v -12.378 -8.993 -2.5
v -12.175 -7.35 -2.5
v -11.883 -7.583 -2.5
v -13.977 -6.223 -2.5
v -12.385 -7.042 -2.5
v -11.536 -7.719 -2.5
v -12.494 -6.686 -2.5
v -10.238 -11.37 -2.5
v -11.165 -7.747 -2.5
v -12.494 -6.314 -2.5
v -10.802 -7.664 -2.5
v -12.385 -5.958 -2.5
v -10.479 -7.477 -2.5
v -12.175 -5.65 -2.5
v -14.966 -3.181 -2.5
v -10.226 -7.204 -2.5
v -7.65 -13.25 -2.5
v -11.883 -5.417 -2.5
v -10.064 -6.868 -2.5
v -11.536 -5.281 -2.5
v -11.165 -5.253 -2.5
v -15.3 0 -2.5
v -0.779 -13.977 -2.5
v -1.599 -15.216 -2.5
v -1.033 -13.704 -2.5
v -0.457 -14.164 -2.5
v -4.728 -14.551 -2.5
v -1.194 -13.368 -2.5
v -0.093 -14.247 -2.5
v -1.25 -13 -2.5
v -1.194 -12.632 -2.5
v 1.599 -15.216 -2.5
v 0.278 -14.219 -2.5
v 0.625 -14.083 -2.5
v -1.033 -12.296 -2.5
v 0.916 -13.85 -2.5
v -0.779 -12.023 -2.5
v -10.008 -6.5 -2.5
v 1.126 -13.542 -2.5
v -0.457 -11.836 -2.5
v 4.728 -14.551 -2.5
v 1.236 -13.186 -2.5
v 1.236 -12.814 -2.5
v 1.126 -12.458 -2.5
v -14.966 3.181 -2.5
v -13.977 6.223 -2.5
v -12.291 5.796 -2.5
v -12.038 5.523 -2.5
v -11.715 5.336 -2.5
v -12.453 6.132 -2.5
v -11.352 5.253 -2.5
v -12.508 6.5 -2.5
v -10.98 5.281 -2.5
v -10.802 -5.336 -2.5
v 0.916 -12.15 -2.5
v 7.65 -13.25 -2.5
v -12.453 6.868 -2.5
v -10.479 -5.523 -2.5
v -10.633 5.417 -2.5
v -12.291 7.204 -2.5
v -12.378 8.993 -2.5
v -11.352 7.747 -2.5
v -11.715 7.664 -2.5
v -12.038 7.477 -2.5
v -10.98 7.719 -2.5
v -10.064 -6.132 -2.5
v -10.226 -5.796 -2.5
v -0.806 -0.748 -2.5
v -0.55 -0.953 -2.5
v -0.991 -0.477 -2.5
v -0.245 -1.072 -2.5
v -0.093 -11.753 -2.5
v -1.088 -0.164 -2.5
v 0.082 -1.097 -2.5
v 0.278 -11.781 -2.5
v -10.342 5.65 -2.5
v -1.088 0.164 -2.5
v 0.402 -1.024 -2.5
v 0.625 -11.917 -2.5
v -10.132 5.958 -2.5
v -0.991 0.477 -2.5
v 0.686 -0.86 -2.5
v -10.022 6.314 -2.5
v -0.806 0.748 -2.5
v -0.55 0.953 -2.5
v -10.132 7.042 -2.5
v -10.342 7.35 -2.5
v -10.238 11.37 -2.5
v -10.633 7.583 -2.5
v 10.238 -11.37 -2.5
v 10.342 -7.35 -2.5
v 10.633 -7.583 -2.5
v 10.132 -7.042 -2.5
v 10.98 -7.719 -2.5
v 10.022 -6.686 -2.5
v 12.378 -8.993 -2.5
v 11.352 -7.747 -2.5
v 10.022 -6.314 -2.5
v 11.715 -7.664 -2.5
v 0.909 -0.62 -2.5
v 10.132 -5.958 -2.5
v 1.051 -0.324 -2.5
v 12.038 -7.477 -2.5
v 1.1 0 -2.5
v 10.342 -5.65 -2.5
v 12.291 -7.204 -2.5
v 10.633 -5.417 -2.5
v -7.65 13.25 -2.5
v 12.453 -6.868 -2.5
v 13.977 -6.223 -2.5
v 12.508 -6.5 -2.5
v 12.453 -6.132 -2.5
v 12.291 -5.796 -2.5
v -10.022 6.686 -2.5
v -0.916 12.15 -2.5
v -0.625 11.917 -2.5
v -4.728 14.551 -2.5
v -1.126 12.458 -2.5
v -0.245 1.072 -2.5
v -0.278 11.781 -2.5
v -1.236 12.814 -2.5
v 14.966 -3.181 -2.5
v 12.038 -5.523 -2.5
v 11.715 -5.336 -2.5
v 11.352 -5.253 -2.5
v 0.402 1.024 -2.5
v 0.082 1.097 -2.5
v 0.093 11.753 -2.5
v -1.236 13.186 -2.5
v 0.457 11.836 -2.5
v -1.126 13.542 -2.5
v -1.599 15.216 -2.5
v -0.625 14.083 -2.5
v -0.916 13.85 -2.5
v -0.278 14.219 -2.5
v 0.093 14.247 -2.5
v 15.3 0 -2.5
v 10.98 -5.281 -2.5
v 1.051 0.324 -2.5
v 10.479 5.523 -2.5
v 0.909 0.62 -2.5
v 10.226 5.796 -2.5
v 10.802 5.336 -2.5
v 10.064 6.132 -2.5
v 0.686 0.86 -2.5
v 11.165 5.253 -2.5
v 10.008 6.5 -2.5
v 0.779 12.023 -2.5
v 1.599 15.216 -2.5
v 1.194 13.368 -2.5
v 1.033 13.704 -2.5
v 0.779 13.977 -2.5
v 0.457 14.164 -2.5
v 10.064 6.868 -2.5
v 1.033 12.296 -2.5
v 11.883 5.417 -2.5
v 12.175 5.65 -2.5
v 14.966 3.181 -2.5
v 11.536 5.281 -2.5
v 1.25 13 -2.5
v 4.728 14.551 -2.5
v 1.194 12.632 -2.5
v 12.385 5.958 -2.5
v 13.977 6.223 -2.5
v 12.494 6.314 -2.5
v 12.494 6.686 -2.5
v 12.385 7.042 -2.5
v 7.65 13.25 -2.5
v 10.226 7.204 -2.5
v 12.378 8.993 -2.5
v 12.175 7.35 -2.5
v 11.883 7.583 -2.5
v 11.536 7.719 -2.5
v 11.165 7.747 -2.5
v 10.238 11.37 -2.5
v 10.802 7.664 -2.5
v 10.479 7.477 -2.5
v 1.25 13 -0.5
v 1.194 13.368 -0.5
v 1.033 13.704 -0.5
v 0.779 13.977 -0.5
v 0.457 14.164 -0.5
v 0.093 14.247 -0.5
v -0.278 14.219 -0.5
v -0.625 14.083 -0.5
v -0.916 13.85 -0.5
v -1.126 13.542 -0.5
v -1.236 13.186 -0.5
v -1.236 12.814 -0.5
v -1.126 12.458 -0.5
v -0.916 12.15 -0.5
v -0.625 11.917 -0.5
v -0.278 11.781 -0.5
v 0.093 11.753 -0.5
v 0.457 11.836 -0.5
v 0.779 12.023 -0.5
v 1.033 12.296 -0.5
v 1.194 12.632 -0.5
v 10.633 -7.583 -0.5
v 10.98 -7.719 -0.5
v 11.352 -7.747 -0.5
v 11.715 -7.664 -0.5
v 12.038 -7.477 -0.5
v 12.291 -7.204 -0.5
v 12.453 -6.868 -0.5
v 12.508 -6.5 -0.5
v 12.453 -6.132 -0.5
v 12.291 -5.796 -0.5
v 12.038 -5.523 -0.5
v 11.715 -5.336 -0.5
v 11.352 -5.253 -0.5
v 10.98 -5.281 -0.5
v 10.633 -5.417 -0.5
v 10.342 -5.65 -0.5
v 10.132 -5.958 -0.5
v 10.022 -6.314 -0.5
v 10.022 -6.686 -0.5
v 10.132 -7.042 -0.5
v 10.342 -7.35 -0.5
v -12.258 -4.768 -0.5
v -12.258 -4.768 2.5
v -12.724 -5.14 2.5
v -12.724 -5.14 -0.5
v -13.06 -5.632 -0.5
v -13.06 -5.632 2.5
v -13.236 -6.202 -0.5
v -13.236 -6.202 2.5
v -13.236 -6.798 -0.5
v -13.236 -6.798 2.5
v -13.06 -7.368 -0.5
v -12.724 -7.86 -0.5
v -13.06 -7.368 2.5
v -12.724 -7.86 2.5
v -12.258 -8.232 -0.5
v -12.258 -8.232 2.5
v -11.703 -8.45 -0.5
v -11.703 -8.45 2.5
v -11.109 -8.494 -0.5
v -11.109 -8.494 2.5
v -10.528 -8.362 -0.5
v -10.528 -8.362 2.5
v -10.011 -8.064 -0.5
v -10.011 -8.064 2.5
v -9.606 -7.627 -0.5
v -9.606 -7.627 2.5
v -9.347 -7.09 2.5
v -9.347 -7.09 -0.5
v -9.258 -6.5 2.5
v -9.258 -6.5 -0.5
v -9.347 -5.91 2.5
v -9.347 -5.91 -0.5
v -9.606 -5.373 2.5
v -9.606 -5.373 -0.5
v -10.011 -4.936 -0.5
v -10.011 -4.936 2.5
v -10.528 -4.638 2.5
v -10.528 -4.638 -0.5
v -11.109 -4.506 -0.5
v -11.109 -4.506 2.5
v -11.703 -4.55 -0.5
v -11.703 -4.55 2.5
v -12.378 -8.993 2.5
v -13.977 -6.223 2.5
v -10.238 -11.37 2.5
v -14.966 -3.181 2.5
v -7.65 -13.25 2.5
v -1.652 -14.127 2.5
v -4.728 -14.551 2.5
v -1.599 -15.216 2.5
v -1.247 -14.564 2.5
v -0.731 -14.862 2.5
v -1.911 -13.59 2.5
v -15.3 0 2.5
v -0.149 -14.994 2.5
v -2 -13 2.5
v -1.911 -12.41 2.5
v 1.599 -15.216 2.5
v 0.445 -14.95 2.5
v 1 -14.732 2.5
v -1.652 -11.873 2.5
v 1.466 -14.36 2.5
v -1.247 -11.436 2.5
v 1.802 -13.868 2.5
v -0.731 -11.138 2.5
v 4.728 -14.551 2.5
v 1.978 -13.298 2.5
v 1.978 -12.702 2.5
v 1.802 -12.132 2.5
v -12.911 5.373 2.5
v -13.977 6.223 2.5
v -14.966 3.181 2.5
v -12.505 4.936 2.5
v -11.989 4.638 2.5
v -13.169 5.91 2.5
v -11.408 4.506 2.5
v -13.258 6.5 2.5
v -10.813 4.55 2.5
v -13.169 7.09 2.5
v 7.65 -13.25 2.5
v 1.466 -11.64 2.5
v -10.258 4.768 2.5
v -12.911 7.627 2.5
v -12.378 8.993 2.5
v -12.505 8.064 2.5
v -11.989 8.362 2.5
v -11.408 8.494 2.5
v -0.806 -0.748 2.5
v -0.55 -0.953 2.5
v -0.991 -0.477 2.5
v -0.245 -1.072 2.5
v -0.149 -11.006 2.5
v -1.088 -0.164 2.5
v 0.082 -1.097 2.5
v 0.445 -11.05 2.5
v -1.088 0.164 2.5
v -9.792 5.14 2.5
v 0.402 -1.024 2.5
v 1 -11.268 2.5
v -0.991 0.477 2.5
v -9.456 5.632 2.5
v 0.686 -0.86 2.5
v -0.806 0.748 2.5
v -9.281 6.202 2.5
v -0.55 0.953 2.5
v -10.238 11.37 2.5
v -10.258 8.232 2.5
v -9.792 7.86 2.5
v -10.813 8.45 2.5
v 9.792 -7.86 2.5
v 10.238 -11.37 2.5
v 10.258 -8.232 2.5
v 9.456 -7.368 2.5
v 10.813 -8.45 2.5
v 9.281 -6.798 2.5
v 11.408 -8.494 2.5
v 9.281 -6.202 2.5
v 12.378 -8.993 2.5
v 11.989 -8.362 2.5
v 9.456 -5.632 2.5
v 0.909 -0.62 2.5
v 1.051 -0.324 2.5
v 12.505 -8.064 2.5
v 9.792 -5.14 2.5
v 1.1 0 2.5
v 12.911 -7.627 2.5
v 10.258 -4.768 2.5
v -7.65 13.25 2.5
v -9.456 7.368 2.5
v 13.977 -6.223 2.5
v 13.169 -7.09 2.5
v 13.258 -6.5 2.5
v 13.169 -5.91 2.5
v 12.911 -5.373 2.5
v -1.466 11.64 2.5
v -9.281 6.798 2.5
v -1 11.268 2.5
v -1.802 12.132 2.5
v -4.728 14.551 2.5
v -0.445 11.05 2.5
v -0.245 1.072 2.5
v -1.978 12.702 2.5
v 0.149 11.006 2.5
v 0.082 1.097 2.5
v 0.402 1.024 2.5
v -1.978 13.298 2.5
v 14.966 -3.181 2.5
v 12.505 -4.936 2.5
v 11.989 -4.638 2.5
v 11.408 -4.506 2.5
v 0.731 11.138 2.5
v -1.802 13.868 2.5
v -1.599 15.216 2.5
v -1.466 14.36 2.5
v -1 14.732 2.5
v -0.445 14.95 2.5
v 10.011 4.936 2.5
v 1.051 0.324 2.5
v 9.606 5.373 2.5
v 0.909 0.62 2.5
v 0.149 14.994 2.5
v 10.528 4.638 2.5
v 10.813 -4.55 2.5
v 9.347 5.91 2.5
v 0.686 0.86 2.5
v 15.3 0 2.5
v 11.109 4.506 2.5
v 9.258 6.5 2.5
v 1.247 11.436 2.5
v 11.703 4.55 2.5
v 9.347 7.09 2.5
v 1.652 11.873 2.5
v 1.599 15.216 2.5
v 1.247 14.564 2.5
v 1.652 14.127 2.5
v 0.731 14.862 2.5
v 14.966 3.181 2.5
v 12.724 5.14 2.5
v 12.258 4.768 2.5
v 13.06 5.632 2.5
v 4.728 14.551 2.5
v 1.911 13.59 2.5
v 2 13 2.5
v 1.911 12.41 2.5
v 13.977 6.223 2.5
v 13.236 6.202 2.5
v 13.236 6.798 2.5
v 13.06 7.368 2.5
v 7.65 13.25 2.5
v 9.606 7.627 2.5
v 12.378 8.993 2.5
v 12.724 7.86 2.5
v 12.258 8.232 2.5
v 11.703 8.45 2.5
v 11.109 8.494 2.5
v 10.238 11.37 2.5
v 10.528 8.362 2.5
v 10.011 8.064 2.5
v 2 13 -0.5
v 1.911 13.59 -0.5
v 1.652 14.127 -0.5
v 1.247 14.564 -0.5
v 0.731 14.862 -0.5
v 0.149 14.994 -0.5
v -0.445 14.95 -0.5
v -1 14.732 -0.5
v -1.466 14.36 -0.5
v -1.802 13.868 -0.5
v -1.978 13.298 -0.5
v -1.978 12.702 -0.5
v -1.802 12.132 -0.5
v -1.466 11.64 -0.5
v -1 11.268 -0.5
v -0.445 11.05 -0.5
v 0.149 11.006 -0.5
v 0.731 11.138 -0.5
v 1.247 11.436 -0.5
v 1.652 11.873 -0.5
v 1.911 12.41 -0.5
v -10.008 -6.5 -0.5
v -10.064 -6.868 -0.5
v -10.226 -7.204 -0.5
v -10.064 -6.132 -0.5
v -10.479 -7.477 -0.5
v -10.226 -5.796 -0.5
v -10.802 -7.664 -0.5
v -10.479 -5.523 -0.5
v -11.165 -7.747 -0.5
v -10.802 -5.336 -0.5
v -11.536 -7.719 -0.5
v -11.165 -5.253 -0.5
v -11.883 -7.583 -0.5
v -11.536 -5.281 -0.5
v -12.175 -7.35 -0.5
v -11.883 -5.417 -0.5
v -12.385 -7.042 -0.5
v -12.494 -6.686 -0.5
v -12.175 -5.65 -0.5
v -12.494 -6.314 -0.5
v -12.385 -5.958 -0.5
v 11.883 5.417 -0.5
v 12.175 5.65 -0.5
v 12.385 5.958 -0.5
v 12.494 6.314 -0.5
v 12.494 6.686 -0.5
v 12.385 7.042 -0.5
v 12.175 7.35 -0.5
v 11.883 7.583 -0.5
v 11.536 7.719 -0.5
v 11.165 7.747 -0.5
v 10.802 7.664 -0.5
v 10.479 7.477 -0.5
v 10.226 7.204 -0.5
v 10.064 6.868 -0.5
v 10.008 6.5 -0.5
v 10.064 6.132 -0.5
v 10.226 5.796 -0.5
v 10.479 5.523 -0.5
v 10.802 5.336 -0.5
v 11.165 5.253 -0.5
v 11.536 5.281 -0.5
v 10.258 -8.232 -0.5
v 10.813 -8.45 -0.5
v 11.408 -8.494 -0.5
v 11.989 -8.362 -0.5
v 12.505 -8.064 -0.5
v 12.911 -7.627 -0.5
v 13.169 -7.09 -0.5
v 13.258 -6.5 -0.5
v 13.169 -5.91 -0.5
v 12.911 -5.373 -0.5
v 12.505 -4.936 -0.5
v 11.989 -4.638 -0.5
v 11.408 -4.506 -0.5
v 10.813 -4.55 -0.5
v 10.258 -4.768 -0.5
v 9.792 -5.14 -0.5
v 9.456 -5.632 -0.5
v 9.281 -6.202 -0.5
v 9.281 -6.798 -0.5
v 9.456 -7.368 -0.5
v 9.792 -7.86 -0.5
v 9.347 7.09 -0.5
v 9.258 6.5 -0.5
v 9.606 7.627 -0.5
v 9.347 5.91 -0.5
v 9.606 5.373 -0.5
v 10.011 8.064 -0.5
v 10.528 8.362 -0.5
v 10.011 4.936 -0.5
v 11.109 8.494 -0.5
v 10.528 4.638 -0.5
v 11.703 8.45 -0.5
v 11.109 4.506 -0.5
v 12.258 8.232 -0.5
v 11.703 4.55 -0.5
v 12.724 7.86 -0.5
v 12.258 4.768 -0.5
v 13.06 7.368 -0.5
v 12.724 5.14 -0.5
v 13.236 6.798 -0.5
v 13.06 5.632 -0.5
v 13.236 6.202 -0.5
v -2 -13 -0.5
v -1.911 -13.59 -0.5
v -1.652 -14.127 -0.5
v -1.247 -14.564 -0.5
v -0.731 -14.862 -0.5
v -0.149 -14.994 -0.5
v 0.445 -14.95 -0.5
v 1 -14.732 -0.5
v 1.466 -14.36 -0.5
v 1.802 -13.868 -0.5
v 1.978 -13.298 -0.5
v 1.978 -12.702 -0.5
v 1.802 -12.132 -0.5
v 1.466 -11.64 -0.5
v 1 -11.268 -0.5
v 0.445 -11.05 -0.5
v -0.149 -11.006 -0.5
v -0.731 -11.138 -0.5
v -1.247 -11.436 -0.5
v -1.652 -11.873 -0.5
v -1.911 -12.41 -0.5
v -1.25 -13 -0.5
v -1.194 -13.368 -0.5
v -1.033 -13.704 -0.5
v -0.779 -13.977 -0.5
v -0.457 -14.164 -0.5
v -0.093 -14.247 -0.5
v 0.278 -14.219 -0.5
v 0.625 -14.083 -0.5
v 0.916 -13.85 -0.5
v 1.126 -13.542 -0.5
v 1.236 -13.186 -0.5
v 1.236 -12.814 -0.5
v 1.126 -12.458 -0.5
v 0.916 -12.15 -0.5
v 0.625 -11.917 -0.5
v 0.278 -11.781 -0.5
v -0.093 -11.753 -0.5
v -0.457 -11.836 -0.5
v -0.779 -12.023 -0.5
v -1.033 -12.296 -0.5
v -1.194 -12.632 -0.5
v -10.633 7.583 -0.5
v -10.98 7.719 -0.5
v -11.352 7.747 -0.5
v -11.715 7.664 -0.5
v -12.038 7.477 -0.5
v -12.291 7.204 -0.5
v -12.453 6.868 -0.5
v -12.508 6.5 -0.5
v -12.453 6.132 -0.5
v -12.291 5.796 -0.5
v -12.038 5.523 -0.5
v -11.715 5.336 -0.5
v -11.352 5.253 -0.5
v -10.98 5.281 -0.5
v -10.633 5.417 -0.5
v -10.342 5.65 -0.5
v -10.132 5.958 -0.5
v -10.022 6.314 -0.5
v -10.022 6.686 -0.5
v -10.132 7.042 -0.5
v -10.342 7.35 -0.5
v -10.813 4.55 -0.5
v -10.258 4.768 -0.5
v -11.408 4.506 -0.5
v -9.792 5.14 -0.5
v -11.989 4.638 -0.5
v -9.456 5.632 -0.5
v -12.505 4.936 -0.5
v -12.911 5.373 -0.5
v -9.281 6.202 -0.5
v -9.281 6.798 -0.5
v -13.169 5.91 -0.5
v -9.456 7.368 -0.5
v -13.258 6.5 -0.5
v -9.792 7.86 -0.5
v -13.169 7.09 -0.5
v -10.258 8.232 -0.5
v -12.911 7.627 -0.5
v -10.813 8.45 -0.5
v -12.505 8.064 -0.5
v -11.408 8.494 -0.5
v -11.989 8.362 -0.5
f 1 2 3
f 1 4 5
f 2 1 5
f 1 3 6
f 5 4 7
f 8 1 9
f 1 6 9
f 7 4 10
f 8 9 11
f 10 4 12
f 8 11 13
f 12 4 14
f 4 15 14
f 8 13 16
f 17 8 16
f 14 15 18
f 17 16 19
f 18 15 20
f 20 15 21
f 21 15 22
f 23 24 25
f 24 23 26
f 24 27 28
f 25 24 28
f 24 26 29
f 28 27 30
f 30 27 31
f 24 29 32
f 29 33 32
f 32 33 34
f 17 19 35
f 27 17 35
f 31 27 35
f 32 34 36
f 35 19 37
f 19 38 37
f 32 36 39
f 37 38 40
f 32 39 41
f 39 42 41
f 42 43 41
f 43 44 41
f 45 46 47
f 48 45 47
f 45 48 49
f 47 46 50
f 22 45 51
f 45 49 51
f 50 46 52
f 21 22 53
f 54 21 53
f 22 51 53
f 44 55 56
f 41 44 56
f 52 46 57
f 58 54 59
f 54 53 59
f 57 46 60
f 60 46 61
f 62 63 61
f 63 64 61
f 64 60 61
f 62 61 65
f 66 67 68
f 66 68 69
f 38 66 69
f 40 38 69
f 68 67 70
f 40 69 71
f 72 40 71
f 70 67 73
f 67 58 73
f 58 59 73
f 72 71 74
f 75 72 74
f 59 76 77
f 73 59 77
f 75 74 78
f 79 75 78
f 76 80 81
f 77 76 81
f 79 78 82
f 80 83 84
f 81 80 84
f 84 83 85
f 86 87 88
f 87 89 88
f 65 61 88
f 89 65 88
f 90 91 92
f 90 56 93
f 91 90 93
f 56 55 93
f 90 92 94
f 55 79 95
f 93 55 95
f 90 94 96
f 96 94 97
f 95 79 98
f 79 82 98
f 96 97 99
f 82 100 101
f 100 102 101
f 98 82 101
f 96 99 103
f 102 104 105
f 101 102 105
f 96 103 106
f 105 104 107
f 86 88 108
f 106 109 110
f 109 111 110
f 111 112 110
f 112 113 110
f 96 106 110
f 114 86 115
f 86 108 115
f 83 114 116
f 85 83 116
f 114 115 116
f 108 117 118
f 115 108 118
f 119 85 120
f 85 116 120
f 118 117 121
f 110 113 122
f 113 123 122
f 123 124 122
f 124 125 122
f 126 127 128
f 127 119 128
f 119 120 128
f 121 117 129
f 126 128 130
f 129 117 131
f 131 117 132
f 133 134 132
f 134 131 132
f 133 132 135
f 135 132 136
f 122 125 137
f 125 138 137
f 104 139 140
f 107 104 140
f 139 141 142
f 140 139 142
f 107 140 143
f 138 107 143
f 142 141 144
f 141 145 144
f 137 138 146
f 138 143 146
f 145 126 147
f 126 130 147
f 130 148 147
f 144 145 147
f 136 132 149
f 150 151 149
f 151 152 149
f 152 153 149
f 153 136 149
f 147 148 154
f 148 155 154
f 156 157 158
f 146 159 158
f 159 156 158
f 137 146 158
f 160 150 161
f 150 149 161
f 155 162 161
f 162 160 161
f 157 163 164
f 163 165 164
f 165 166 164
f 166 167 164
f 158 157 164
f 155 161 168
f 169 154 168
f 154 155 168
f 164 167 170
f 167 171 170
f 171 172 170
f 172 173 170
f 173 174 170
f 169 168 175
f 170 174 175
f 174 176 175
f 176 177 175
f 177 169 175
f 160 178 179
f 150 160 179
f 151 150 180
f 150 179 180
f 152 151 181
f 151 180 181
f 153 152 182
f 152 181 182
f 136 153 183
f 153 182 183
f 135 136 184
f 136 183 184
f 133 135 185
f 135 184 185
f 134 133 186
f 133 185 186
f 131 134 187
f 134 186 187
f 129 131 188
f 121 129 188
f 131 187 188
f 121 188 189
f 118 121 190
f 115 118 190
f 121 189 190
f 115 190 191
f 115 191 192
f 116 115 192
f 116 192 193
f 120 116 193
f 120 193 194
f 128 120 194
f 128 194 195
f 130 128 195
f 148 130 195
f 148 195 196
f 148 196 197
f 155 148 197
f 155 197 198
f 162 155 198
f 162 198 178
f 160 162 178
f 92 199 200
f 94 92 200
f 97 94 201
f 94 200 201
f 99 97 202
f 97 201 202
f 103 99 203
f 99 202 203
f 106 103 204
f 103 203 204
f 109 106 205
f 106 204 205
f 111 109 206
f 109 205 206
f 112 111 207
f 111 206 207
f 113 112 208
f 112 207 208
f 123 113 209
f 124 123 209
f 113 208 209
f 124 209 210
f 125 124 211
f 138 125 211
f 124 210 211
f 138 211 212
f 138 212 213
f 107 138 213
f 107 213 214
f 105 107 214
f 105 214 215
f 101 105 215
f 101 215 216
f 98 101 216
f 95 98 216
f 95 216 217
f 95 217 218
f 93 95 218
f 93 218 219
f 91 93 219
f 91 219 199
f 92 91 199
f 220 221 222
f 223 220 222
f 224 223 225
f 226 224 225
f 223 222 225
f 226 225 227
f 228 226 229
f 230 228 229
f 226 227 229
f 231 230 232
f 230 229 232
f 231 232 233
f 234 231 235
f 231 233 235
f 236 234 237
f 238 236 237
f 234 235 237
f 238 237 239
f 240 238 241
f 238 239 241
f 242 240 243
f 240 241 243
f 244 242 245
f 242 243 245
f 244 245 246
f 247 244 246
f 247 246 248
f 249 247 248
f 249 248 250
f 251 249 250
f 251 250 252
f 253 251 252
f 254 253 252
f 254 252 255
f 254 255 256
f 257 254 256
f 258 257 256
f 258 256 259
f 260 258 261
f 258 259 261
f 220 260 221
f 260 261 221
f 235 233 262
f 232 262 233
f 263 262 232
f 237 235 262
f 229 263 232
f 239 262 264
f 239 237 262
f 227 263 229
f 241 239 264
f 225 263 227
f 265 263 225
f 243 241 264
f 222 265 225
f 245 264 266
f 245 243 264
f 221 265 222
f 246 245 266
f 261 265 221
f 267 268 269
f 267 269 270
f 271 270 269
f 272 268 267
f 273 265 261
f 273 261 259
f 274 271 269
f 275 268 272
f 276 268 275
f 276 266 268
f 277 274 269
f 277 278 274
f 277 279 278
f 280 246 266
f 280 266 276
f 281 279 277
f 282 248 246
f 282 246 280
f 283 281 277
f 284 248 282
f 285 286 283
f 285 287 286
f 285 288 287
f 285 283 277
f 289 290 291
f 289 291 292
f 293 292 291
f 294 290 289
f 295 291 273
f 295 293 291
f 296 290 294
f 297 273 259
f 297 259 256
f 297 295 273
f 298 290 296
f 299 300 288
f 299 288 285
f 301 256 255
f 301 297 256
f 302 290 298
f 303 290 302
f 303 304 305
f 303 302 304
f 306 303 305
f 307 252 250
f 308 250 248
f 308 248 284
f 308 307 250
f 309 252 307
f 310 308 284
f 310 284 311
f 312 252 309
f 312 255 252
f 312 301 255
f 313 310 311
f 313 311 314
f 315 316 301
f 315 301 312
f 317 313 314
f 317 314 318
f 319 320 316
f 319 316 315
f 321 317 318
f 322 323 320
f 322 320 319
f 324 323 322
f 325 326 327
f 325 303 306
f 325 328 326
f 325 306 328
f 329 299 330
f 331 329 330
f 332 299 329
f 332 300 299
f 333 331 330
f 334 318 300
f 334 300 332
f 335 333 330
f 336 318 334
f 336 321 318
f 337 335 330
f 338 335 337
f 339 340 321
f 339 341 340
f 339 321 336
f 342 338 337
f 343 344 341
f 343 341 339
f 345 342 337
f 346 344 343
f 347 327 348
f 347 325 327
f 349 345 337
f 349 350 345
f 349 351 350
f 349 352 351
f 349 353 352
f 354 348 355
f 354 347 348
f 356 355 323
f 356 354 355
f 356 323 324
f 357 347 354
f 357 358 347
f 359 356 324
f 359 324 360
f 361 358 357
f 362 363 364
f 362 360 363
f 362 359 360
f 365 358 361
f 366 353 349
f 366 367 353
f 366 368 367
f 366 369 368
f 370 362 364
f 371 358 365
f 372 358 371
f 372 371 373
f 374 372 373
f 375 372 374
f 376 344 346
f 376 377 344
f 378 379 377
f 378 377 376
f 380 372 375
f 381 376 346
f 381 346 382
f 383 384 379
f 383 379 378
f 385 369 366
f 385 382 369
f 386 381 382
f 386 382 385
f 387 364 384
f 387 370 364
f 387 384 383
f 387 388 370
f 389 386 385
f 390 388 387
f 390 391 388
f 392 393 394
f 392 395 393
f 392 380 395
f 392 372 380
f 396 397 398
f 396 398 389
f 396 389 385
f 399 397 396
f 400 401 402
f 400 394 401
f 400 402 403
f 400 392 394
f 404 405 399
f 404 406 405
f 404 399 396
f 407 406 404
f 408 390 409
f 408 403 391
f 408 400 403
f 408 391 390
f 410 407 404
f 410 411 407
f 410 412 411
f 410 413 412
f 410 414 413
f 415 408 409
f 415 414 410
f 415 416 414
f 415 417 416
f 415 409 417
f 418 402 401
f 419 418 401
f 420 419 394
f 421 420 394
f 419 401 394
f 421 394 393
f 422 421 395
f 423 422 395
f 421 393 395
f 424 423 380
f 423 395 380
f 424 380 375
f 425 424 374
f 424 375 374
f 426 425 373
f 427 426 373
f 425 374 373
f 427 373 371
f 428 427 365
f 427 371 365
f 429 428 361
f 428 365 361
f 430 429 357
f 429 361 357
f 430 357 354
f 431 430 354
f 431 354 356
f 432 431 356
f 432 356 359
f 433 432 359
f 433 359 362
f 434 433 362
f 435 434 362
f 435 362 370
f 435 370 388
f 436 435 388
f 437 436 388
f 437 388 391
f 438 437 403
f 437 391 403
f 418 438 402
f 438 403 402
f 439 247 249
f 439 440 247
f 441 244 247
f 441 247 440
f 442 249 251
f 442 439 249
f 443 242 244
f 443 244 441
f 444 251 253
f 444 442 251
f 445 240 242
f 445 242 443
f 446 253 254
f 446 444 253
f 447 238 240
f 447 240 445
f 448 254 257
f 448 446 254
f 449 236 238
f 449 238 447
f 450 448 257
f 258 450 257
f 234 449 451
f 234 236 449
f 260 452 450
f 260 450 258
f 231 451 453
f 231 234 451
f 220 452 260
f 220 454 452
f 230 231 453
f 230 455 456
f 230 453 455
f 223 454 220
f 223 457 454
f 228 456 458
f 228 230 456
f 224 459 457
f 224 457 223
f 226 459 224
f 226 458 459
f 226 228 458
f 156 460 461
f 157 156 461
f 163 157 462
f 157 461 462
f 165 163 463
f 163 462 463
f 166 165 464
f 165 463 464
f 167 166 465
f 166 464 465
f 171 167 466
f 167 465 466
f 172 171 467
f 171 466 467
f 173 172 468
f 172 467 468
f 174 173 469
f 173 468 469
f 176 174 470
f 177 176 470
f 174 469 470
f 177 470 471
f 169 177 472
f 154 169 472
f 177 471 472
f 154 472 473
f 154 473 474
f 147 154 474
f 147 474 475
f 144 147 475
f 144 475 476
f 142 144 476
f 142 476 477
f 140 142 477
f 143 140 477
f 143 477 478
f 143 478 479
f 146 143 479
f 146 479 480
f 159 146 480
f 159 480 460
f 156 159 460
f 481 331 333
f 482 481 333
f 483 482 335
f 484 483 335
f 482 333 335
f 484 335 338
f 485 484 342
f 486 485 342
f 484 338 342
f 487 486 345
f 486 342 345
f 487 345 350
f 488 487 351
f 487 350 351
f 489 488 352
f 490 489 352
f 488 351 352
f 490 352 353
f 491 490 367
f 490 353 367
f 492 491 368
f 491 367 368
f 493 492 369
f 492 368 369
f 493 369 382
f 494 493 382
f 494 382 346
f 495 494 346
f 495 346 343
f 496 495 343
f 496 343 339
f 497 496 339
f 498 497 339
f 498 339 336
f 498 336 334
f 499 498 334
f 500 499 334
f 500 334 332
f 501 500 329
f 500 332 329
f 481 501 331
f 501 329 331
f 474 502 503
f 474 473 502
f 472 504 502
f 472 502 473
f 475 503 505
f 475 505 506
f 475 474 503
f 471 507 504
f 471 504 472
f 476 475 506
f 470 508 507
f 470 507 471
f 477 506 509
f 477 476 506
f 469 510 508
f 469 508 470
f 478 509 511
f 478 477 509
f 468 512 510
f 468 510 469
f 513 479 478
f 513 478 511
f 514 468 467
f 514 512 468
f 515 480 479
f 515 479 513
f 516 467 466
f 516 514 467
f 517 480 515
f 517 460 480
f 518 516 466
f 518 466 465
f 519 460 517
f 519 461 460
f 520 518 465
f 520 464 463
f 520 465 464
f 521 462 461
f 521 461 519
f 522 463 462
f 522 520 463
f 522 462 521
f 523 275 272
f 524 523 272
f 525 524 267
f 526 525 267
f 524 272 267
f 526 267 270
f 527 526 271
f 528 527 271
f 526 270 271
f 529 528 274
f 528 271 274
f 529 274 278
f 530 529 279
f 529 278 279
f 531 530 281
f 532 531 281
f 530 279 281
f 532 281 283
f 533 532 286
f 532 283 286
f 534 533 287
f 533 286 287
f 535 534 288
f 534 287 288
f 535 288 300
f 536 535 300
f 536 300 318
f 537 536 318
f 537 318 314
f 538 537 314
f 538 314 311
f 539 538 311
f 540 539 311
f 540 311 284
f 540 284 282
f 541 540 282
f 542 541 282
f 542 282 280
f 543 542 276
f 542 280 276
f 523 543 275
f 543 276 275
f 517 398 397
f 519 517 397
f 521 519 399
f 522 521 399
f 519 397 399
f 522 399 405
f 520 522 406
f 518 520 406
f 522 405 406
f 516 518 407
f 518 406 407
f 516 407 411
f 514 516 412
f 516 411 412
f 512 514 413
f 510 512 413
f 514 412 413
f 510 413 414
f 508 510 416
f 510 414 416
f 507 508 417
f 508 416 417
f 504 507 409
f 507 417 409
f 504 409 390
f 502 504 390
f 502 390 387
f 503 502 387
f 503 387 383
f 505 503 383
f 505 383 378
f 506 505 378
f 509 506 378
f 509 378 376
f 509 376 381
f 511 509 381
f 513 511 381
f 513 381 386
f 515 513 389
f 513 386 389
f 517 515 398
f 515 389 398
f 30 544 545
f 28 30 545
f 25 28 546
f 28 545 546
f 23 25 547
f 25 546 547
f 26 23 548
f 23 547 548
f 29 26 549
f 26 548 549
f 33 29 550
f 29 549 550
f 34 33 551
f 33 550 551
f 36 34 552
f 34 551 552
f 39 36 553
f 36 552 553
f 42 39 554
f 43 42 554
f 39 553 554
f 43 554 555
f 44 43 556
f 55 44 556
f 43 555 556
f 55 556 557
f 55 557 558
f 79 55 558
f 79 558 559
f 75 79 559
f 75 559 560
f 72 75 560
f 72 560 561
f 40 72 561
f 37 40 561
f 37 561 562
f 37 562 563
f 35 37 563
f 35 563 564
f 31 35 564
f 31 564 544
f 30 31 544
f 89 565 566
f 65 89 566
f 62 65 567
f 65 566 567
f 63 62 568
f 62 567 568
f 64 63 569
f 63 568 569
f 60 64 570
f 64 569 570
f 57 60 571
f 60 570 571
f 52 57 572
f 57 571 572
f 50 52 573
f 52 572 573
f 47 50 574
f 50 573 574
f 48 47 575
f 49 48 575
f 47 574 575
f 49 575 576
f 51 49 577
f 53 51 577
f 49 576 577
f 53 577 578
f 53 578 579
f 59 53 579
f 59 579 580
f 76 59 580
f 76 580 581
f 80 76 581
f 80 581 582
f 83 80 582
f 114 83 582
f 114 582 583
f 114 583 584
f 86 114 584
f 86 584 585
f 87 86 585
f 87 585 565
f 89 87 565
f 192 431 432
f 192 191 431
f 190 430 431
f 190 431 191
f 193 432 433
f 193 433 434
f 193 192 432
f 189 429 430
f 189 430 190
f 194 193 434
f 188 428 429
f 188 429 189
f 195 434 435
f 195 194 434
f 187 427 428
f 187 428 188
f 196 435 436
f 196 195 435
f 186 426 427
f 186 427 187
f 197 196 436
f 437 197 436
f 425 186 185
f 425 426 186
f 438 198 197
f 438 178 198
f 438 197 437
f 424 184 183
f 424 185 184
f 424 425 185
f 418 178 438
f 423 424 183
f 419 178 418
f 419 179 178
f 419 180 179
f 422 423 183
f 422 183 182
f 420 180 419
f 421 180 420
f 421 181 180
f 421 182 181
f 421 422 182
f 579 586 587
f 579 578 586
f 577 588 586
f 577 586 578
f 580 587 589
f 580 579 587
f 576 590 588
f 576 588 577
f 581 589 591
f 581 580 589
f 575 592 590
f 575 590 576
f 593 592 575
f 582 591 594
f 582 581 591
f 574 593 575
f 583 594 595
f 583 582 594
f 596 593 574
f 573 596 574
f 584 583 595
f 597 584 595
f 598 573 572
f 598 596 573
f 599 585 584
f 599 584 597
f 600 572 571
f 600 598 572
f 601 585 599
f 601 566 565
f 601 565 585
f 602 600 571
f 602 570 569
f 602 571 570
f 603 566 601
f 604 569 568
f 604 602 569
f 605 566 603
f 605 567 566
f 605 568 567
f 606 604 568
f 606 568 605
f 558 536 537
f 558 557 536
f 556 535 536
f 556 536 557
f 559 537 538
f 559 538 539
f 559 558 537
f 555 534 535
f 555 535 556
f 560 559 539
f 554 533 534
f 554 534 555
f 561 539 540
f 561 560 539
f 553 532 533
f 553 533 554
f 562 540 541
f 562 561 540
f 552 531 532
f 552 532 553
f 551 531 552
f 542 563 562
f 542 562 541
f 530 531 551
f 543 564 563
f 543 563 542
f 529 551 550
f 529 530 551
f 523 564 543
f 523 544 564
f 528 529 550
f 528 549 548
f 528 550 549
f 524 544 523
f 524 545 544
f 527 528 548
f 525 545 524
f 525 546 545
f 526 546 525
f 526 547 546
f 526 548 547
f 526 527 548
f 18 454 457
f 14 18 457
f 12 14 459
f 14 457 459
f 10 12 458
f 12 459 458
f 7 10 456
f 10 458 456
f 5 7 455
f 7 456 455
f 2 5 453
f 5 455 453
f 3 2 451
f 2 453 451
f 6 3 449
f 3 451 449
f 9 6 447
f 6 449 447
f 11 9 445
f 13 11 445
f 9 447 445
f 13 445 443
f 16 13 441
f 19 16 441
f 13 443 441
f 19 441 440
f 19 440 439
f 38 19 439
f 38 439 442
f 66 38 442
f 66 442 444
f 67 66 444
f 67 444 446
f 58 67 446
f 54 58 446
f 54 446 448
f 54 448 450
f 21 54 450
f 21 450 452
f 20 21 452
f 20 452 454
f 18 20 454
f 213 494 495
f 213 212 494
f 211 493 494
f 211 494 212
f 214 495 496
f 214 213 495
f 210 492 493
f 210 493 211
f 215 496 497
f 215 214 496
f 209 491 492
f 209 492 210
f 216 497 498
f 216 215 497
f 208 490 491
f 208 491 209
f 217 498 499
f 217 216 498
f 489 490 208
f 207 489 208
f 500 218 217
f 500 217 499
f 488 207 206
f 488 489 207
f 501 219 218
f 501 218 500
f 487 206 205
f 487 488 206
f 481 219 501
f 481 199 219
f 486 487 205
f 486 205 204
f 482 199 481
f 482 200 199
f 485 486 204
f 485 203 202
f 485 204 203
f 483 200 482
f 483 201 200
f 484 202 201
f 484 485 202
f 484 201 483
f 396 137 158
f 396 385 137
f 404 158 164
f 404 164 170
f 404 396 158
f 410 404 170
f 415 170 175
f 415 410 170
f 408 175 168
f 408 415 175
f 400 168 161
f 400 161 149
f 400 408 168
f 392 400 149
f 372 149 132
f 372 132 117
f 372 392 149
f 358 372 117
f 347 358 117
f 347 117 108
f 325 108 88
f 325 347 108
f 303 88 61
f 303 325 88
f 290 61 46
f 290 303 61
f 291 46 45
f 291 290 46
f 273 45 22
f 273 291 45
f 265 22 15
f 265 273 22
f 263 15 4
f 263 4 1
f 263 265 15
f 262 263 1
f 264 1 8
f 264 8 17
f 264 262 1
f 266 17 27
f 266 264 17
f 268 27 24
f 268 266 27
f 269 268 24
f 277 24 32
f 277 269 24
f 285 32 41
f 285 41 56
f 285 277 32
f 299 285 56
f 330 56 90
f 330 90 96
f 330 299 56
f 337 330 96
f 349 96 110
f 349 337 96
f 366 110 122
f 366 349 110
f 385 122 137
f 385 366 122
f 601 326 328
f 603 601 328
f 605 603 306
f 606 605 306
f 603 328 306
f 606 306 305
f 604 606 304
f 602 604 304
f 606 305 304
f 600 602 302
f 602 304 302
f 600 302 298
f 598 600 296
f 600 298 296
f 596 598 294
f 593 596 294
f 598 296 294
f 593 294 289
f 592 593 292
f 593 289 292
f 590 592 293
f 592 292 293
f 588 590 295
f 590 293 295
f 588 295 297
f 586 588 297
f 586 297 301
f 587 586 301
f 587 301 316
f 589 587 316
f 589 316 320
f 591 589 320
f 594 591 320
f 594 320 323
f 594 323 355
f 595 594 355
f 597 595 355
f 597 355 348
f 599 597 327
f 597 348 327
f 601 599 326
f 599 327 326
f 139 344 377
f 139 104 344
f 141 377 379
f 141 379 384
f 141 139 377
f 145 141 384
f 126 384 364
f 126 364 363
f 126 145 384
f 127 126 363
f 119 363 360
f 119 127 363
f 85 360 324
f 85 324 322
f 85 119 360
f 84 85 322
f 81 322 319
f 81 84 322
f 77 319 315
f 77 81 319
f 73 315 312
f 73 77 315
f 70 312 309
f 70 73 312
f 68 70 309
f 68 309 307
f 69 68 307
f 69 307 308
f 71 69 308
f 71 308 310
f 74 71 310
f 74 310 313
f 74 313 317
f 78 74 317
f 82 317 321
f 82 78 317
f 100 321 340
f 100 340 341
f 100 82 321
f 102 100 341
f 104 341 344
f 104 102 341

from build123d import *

# Parameters (mm, degrees)
SKETCH_1_R               = 15.3
SKETCH_1_R_2             = 1.1
EXTRUDE_1_DEPTH          = 2.5
SKETCH_2_R               = 1.25
CUT_EXTRUDE_1_DEPTH      = 23.207656337
SKETCH_2_2_R             = 2
CUT_EXTRUDE_2_DEPTH      = 3
PATTERN_CIRCULAR_1_COUNT = 6


with BuildPart() as part:
    # 草图1 → 凸台-拉伸1 (new, symmetric)
    with BuildSketch(Plane.XY):
        Circle(SKETCH_1_R)
        Circle(SKETCH_1_R_2, mode=Mode.SUBTRACT)
    extrude(amount=EXTRUDE_1_DEPTH, both=True)

    # 草图2 → 切除-拉伸1 (cut, through all)
    with BuildSketch(Plane.XY.offset(2.5)):
        with Locations((0, 13)):
            Circle(SKETCH_2_R)
    cut_extrude_1 = extrude(amount=-CUT_EXTRUDE_1_DEPTH, mode=Mode.SUBTRACT)

    # 草图2<2> → 切除-拉伸2 (cut)
    with BuildSketch(Plane.XY.offset(2.5)):
        with Locations((0, 13)):
            Circle(SKETCH_2_2_R)
    cut_extrude_2 = extrude(amount=-CUT_EXTRUDE_2_DEPTH, mode=Mode.SUBTRACT)

    # 阵列(圆周)1: 切除-拉伸1, 切除-拉伸2 ×6 about axis
    pattern_circular_1_axis = Axis((0, 0, 0), (0, 0, 1))
    add([cut_extrude_1.rotate(pattern_circular_1_axis, i * 360 / PATTERN_CIRCULAR_1_COUNT) for i in range(1, PATTERN_CIRCULAR_1_COUNT)], mode=Mode.SUBTRACT)
    add([cut_extrude_2.rotate(pattern_circular_1_axis, i * 360 / PATTERN_CIRCULAR_1_COUNT) for i in range(1, PATTERN_CIRCULAR_1_COUNT)], mode=Mode.SUBTRACT)


solid = part.part
